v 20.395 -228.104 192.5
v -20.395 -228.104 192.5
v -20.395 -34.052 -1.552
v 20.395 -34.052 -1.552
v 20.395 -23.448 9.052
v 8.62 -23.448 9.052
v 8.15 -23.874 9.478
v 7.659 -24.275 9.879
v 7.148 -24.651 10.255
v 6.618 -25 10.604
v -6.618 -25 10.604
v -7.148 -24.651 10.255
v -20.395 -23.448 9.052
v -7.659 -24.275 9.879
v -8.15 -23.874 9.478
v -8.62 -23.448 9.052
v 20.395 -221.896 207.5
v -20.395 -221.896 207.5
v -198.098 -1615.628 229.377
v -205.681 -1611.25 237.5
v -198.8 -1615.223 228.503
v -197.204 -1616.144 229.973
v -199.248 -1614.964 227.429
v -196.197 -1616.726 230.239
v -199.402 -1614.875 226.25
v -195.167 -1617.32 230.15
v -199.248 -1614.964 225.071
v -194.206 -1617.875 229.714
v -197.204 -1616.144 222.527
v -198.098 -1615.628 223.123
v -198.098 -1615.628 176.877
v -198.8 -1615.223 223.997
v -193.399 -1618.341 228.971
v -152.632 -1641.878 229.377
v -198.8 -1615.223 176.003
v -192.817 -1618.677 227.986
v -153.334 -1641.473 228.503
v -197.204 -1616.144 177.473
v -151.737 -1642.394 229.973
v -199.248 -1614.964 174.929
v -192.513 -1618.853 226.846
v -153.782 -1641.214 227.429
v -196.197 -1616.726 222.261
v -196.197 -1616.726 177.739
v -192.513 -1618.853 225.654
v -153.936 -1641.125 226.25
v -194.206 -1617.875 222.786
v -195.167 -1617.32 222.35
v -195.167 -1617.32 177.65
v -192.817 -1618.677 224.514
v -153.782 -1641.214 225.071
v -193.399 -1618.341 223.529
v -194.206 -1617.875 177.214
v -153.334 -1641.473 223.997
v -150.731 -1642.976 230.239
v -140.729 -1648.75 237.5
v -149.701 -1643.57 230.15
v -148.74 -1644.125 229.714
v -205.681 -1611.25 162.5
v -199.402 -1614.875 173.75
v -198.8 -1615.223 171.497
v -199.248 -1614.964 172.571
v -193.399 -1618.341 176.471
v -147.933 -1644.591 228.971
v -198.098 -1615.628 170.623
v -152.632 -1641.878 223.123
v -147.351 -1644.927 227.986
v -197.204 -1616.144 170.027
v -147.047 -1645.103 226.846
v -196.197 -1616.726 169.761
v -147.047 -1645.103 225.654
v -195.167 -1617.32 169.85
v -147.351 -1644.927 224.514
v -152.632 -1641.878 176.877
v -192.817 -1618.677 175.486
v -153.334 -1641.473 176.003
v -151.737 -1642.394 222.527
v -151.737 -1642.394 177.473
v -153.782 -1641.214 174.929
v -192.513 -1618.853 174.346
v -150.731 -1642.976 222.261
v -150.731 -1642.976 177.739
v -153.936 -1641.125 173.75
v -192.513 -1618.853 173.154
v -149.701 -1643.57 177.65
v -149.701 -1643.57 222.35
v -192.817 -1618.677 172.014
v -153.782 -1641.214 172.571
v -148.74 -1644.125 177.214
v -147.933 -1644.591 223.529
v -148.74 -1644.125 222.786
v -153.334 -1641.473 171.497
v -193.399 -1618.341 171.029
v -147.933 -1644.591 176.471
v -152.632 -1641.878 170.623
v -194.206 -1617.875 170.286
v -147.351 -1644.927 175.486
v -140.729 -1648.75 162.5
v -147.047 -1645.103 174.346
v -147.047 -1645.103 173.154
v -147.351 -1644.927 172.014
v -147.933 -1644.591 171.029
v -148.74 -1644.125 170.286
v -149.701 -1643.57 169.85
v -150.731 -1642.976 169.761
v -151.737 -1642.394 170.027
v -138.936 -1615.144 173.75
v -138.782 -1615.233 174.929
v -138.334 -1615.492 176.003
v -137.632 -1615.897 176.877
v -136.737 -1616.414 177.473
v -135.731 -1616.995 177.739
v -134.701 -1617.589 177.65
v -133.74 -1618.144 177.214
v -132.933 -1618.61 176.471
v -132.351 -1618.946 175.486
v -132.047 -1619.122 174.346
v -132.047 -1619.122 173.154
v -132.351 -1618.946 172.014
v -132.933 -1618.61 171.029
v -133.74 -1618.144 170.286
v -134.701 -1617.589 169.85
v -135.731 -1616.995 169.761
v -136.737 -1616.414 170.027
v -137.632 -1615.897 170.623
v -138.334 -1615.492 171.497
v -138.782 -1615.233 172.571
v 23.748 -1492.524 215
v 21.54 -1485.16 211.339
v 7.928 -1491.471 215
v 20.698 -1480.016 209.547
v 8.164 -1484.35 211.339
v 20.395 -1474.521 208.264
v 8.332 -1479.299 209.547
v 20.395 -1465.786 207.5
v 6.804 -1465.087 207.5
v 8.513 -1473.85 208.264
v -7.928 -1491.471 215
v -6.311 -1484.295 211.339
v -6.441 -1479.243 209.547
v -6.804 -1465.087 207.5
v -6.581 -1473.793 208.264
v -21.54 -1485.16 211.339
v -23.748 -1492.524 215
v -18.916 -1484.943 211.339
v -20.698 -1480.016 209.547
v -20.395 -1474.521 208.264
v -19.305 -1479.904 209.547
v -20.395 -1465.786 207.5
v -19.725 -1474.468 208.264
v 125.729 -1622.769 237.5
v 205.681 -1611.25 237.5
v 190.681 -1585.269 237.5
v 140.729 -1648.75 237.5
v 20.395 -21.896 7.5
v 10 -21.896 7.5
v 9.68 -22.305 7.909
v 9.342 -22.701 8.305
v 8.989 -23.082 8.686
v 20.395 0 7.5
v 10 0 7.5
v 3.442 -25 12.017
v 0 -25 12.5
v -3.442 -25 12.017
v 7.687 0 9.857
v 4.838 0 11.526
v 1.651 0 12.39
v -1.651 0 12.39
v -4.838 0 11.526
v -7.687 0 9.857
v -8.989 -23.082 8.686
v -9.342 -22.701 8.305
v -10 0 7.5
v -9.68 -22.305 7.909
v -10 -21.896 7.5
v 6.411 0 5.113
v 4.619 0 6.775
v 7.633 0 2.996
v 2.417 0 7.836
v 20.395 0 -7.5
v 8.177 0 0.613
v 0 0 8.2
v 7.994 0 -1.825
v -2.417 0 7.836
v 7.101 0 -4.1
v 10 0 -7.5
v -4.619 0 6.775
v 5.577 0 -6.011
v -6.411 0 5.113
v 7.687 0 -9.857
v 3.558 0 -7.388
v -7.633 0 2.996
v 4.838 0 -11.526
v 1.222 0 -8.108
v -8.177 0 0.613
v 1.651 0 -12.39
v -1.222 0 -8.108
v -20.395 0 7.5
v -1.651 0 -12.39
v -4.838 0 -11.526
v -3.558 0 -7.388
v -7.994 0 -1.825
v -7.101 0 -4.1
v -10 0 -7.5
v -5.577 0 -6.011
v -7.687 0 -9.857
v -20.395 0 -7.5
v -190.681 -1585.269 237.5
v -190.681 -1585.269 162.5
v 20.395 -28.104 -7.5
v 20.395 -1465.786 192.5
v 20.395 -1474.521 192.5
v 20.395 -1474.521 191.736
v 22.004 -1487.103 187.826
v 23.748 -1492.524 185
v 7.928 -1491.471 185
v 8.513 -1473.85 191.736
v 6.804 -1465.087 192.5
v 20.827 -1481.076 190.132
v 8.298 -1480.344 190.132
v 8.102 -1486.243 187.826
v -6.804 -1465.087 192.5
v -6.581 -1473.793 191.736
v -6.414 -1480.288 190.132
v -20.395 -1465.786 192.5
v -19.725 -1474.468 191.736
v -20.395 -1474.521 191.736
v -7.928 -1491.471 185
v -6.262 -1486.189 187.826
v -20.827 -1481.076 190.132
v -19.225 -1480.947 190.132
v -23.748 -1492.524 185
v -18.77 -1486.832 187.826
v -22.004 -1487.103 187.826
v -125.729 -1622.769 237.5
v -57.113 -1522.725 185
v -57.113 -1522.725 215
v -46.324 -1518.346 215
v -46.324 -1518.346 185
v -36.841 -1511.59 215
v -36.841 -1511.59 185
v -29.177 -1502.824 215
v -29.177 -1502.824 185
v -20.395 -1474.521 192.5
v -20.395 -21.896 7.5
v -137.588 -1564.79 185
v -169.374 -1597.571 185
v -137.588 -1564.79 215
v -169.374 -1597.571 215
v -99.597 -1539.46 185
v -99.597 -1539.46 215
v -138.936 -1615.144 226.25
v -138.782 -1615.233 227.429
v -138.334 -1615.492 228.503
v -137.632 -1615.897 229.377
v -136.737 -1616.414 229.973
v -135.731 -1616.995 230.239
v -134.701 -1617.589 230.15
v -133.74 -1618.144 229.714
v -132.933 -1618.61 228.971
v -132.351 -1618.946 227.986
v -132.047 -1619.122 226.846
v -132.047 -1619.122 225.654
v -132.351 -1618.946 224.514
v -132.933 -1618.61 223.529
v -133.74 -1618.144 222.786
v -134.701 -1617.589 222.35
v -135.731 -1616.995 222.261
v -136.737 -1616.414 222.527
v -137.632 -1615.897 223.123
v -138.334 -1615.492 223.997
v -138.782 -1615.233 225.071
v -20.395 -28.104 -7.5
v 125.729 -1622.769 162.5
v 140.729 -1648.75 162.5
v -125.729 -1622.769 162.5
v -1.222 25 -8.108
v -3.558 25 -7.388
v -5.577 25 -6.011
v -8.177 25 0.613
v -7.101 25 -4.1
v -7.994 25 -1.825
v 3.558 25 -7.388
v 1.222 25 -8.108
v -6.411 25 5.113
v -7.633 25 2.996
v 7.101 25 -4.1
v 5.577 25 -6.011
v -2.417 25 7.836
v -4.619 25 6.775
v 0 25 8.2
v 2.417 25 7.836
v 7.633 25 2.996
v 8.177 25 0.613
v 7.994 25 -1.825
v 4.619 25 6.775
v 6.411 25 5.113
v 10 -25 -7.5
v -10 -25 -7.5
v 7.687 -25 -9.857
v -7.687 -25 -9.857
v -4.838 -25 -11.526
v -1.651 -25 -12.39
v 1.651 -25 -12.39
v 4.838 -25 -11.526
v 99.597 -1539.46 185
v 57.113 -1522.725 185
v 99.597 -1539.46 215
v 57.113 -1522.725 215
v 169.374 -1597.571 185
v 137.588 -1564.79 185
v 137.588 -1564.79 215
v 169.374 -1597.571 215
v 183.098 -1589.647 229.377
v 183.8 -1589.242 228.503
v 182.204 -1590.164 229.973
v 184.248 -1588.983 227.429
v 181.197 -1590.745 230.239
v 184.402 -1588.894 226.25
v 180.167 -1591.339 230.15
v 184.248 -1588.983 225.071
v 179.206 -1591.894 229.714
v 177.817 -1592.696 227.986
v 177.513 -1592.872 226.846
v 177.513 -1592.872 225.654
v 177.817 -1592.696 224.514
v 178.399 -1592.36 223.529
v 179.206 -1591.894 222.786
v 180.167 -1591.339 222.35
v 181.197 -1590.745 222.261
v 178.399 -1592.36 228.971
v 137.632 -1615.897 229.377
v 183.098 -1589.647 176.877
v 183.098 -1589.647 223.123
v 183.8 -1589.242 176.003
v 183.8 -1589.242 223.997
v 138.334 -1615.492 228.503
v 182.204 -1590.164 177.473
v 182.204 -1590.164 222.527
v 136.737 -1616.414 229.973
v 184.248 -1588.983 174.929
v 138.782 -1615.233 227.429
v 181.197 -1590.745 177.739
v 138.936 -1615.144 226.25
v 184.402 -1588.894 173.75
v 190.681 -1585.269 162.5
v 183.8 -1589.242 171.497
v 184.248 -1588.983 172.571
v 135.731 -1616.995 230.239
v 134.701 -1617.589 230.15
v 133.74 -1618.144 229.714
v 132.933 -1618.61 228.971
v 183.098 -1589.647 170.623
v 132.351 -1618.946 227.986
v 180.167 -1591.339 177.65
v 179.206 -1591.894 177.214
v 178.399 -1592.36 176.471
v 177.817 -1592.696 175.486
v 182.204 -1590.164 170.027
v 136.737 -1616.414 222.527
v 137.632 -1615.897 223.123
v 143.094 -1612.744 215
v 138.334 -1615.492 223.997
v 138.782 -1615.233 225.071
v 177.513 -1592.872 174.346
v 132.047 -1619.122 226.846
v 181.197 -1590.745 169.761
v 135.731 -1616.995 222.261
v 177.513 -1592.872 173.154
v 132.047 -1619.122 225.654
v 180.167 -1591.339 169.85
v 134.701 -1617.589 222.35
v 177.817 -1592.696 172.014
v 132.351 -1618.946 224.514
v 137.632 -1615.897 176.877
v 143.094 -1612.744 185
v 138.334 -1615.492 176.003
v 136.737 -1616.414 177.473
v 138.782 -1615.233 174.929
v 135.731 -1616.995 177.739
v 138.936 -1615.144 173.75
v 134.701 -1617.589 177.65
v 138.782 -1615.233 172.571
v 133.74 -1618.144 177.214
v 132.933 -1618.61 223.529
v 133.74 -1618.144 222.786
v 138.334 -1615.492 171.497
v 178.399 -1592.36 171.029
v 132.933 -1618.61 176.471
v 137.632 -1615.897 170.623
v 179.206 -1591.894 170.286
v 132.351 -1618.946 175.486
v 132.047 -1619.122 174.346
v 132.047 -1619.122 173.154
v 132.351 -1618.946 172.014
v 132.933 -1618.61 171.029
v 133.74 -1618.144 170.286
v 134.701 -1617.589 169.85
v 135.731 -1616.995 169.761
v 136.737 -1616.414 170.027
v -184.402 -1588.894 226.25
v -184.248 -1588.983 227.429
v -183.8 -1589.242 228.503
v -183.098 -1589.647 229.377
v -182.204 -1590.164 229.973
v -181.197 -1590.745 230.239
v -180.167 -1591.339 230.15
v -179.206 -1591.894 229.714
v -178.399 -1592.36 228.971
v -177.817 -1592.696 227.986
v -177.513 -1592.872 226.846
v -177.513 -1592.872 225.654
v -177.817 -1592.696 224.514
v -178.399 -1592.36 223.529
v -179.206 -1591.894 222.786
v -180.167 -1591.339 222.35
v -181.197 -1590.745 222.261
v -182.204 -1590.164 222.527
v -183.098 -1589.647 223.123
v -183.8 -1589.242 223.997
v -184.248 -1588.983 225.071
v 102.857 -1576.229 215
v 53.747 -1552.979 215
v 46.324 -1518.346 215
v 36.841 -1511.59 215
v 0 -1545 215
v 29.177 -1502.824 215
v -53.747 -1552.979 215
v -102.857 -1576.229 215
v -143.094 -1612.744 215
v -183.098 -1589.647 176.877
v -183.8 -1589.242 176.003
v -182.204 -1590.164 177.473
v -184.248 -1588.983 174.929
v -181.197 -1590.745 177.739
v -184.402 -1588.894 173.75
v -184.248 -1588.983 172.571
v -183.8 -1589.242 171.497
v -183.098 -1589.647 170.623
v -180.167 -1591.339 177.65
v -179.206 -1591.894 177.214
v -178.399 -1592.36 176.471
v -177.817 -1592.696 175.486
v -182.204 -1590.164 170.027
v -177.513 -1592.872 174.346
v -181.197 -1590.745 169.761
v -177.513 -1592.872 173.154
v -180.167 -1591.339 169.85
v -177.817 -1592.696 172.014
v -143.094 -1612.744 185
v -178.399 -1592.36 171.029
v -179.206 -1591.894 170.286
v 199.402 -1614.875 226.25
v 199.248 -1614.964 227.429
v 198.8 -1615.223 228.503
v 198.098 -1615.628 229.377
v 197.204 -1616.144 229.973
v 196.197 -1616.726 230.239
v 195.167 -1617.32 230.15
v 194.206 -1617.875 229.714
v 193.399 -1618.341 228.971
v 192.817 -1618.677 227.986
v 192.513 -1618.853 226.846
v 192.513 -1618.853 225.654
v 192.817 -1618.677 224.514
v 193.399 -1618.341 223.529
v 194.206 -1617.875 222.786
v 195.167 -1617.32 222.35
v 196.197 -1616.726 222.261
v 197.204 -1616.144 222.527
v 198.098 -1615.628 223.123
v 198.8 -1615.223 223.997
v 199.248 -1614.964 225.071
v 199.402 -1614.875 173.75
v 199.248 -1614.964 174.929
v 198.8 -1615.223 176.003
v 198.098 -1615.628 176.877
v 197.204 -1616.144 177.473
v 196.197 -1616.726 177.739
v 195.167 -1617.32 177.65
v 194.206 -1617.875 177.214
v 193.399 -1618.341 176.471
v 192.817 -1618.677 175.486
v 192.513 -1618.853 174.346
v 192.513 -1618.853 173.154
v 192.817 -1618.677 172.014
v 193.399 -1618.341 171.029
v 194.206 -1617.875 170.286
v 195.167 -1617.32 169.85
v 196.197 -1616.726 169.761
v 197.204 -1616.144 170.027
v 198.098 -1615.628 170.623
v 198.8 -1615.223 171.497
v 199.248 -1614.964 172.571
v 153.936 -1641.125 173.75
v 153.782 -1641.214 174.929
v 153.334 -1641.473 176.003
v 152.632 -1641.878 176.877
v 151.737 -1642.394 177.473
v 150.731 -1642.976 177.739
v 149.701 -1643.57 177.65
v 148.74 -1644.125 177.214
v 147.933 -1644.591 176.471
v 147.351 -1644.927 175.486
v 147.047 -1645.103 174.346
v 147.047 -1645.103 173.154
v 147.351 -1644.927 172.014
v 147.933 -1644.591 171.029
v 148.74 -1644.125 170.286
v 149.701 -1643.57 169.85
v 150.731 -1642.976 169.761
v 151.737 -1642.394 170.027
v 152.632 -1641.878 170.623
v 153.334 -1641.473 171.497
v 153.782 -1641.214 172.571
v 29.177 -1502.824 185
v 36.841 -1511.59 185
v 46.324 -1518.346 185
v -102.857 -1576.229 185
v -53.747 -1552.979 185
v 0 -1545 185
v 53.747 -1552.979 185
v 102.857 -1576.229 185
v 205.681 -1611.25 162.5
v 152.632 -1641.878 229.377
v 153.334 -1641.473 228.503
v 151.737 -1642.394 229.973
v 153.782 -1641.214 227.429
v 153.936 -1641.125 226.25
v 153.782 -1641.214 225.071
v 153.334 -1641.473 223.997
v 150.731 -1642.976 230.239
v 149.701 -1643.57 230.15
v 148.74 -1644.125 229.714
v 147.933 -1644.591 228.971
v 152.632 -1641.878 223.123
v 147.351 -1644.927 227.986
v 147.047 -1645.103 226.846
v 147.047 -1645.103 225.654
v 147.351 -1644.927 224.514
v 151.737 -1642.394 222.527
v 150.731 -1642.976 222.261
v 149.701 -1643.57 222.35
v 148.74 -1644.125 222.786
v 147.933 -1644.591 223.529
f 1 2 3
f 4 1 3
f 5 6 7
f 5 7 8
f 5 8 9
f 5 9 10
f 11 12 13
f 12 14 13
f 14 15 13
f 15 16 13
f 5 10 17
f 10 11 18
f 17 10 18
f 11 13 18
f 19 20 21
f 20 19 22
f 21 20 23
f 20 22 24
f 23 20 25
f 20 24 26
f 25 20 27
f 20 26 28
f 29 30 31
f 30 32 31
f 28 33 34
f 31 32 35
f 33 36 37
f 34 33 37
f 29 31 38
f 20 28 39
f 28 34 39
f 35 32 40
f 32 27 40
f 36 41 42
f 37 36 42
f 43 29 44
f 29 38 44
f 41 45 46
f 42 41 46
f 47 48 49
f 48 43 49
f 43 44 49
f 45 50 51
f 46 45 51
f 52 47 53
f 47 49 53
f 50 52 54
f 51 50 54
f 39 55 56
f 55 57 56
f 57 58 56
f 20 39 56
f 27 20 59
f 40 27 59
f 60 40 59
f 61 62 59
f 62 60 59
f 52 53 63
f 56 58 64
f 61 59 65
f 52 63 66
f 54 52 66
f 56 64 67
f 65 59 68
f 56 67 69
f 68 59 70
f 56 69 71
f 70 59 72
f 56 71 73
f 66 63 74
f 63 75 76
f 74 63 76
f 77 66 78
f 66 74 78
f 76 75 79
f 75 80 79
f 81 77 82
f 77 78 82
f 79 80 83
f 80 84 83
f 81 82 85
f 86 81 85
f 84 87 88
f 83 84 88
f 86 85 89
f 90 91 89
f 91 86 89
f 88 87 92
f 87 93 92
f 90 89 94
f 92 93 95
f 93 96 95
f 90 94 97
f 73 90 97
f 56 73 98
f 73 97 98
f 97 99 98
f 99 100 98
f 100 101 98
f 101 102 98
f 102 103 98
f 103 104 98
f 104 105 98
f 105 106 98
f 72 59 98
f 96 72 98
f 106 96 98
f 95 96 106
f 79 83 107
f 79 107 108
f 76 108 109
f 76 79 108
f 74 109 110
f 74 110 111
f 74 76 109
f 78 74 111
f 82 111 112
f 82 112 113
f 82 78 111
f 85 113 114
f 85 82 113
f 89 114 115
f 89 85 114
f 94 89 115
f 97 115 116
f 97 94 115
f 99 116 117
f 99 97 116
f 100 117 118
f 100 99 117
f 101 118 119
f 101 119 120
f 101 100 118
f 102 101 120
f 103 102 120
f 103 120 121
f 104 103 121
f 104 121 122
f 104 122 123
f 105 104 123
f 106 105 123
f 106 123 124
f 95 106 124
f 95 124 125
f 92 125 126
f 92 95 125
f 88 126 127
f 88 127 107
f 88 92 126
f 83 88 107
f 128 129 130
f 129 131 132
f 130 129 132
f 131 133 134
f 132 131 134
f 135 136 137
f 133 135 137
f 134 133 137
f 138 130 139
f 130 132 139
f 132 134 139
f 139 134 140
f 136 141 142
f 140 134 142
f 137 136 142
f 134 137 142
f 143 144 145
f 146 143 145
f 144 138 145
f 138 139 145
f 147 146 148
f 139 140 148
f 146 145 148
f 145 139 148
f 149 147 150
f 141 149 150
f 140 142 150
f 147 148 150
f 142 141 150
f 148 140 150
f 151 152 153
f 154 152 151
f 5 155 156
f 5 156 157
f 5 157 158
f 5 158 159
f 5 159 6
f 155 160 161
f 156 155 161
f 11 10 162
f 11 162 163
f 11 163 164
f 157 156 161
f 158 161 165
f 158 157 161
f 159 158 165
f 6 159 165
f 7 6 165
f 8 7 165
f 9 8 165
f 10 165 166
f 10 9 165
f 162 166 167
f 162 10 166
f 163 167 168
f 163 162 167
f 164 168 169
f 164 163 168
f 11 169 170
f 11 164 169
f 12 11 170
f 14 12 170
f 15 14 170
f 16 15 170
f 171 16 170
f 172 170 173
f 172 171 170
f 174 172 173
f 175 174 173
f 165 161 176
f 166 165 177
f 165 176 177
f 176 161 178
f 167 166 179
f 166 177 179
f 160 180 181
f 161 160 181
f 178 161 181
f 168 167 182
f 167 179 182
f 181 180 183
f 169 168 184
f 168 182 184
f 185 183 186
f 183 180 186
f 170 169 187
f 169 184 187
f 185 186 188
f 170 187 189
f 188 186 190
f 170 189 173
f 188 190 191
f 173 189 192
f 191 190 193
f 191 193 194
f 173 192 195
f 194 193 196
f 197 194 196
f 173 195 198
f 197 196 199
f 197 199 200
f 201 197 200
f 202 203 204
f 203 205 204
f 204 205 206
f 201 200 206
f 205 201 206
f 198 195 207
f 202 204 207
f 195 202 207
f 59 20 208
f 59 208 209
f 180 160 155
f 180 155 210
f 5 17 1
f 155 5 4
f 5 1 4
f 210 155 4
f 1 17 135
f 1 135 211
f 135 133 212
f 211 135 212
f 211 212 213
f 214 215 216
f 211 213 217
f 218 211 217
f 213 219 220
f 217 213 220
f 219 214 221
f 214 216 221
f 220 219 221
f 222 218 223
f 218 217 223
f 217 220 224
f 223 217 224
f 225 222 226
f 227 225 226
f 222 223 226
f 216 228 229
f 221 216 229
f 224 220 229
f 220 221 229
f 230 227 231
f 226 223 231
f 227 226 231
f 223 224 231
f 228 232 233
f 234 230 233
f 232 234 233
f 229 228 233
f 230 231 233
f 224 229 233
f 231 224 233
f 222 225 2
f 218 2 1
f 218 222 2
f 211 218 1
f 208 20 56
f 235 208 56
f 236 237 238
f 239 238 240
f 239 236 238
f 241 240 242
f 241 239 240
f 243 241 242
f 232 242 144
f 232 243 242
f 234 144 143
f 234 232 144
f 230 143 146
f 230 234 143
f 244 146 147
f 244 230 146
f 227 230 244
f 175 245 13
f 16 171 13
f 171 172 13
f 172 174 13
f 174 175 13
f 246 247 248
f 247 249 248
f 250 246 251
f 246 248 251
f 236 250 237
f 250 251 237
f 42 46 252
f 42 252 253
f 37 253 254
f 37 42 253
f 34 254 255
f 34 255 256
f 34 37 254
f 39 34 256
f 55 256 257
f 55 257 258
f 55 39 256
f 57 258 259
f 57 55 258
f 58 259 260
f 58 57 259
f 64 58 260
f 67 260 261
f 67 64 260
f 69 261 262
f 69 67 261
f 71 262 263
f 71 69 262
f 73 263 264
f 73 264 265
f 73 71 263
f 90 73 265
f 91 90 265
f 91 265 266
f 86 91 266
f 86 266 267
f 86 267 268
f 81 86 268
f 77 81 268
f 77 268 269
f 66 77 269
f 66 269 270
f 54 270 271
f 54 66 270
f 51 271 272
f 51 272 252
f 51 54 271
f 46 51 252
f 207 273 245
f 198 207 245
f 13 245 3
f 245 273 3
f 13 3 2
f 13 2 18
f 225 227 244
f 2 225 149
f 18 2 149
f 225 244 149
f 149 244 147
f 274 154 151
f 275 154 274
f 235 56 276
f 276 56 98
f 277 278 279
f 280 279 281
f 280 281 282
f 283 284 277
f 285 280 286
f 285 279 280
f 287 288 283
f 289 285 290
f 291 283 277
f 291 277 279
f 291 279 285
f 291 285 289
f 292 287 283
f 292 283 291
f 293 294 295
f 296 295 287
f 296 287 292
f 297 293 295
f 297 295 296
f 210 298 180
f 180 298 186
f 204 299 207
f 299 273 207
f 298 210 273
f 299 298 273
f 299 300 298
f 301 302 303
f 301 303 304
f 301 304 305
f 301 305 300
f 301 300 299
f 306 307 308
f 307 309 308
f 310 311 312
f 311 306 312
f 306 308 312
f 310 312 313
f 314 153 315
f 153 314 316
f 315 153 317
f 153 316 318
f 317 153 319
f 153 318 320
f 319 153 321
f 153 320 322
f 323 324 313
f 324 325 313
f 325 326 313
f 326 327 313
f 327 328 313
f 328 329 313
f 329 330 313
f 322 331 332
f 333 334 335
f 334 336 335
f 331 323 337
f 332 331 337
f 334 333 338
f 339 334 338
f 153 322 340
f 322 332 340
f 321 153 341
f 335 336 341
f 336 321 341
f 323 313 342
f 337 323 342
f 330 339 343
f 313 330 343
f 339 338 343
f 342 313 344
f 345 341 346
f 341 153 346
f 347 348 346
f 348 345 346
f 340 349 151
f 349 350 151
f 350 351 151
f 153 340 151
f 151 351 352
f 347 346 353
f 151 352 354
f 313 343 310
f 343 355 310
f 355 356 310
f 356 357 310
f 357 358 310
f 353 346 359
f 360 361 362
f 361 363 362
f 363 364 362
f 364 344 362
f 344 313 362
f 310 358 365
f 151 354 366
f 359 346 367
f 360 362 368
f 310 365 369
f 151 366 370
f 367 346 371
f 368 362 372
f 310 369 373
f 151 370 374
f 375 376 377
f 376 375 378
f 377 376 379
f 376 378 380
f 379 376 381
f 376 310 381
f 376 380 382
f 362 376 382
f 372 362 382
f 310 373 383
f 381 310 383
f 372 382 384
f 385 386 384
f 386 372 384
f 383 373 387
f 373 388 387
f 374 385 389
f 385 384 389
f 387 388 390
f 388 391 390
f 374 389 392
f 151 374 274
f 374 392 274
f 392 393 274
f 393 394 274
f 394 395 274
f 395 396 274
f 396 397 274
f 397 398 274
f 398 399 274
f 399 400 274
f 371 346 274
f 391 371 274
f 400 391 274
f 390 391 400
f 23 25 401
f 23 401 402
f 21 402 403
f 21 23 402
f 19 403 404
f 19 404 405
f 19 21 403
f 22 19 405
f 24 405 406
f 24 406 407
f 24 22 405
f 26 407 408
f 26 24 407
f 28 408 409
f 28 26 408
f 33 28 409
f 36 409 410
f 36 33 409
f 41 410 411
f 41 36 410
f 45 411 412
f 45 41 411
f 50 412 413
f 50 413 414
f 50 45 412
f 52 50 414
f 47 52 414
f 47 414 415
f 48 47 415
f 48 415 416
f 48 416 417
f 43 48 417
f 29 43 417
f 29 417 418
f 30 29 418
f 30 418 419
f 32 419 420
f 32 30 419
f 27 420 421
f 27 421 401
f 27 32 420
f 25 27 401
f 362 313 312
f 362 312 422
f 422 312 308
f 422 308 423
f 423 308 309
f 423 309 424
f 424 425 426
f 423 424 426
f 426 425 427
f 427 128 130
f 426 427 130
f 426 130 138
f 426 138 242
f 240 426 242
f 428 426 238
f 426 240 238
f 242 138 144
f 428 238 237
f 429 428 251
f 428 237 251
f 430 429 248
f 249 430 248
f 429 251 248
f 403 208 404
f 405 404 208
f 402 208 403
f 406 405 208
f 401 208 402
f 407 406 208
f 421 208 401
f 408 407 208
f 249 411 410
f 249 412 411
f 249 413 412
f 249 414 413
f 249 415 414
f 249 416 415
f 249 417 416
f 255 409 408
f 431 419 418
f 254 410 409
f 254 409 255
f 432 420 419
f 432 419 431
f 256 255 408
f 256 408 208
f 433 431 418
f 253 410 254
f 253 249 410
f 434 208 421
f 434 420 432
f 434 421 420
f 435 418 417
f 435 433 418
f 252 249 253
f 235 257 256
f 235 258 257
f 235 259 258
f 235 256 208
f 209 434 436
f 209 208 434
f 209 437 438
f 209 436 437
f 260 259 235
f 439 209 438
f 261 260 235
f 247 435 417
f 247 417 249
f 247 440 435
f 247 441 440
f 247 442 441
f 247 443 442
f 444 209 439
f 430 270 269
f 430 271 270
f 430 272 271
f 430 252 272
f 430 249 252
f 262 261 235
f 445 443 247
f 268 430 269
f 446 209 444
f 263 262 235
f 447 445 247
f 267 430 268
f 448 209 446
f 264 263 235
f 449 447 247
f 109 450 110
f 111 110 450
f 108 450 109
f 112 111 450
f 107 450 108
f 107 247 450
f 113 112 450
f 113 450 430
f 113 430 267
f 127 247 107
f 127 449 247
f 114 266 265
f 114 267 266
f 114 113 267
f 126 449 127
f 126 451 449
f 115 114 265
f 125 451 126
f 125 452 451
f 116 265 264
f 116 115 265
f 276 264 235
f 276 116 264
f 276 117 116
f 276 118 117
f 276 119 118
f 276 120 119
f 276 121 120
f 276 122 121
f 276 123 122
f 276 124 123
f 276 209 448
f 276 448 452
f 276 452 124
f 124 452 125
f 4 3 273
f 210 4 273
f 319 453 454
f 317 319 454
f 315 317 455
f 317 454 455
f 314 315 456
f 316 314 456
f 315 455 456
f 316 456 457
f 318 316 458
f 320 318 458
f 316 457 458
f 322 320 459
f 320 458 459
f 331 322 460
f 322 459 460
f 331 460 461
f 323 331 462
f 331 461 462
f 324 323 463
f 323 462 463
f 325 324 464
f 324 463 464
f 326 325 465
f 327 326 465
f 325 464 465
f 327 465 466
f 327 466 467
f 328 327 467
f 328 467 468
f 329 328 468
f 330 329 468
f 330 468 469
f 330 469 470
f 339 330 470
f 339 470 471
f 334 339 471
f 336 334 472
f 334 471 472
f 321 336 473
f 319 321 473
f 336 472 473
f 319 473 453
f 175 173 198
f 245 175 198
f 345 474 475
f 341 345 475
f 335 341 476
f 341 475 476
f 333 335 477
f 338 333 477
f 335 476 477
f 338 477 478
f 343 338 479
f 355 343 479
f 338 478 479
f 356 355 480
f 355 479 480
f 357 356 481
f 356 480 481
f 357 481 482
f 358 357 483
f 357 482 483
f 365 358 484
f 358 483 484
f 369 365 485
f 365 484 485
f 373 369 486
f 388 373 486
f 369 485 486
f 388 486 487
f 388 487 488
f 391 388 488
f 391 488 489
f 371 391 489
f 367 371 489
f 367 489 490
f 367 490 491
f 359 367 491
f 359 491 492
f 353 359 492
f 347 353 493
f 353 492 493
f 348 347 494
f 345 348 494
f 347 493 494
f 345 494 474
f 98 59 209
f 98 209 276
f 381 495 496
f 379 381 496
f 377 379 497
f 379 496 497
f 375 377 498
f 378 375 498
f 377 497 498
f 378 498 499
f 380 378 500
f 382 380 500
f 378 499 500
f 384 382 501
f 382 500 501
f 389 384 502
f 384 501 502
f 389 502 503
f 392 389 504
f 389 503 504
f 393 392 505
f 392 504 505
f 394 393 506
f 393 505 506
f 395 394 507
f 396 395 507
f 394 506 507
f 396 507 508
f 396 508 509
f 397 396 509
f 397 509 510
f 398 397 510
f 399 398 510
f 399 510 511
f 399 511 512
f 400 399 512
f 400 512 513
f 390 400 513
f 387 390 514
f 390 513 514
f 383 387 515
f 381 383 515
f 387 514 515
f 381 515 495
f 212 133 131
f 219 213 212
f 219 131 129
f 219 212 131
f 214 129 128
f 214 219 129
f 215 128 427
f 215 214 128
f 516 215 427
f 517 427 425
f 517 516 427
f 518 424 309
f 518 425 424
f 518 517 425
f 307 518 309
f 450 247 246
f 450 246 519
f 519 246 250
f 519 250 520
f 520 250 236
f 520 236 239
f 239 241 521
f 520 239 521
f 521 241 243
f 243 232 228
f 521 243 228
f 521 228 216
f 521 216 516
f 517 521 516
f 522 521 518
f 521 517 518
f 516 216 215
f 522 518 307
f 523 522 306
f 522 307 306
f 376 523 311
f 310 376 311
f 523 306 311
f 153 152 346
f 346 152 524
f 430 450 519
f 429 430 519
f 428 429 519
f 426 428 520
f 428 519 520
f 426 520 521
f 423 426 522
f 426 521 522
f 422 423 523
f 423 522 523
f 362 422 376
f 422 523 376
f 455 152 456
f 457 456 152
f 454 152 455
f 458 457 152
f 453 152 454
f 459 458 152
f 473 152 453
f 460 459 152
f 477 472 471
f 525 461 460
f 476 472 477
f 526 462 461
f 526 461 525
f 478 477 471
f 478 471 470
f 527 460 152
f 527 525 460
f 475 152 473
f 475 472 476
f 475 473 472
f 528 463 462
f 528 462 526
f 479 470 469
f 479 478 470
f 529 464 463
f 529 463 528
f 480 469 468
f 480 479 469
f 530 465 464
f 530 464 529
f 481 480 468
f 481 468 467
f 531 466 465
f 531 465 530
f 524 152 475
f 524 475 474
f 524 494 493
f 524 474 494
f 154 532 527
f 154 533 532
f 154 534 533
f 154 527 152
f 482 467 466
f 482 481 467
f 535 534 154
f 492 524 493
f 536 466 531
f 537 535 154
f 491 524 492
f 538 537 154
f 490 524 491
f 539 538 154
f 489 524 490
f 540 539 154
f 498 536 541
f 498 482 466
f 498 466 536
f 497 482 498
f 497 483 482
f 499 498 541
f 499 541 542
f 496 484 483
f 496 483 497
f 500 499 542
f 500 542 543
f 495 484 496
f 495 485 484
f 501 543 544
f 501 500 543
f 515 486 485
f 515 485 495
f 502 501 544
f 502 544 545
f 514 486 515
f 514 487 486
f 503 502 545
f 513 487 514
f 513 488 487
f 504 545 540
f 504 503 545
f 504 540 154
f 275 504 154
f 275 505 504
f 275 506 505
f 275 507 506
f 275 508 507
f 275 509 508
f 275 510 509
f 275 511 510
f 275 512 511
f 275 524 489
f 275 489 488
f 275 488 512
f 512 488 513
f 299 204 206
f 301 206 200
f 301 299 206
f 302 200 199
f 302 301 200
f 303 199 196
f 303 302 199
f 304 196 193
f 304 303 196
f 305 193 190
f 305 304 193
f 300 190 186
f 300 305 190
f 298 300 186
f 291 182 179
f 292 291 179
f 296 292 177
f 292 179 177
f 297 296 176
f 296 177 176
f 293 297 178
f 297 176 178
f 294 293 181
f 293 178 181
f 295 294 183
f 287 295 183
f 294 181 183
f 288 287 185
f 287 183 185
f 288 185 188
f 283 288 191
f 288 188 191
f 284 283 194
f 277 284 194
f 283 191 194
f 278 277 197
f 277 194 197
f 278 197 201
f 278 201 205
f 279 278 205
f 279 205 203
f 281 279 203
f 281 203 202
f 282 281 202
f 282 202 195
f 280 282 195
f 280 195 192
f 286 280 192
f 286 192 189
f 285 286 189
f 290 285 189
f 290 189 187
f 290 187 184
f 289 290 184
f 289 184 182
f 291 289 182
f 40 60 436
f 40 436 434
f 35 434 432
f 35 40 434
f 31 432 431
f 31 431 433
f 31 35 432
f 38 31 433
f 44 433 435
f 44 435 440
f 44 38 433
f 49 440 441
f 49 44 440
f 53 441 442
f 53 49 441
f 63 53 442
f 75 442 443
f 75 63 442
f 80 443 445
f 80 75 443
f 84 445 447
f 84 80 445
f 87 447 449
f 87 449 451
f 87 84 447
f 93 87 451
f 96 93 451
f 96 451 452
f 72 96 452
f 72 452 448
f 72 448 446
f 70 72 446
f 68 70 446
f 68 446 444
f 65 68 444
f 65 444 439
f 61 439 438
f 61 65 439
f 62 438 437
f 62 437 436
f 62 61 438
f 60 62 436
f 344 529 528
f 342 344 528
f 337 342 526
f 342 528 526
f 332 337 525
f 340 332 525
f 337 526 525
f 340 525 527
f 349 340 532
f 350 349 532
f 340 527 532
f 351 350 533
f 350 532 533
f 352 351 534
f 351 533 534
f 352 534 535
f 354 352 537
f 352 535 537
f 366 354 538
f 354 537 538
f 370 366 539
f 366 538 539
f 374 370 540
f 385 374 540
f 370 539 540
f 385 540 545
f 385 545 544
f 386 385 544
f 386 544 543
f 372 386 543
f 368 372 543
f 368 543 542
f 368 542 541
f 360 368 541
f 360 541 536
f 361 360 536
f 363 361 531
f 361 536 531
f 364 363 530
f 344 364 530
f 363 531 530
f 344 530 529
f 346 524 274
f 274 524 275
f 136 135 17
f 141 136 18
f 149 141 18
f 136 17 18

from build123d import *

# Parameters (mm, degrees)
SKETCH1_R                = 8.2
BOSS_EXTRUDE1_DEPTH      = 25
SKETCH2_W                = 40.79
SKETCH2_H                = 15
BOSS_EXTRUDE2_DEPTH      = 25
SKETCH3_R                = 12.5
BOSS_EXTRUDE4_DEPTH      = 25
BOSS_EXTRUDE5_REACH      = 51.448
SKETCH5_W                = 40.79
SKETCH5_H                = 15
BOSS_EXTRUDE7_DEPTH      = 1505
BOSS_EXTRUDE8_START      = -40.79
BOSS_EXTRUDE8_DEPTH      = 40.79
SKETCH9_W                = 15
SKETCH9_H                = 15
REVOLVE1_ANGLE           = 60
REVOLVE1_OTHER_WAY_ANGLE = 60
FILLET3_R                = 50
SKETCH11_W               = 75
SKETCH11_H               = 75
SKETCH11_R               = 4
BOSS_EXTRUDE9_DEPTH      = 30
CUT_EXTRUDE2_DEPTH       = 1755.203433898


with BuildPart() as part:
    # Sketch1 → Boss-Extrude1 (new body)
    with BuildSketch(Plane(origin=(0, 0, 0), x_dir=(1, 0, 0), z_dir=(0, 1, 0))):
        with Locations(Location((0, 0, 0), (0, 0, 270))):
            Circle(SKETCH1_R)
    extrude(amount=BOSS_EXTRUDE1_DEPTH)

    # Sketch2 → Boss-Extrude2 (add)
    with BuildSketch(Plane(origin=(0, 0, 0), x_dir=(-1, 0, 0), z_dir=(0, -1, 0))):
        Rectangle(SKETCH2_W, SKETCH2_H)
    extrude(amount=BOSS_EXTRUDE2_DEPTH)

    # Sketch3 → Boss-Extrude4 (add)
    with BuildSketch(Plane(origin=(0, -25, 0), x_dir=(-1, 0, 0), z_dir=(0, -1, 0))):
        Circle(SKETCH3_R)
    extrude(amount=-BOSS_EXTRUDE4_DEPTH)

    # Boss-Extrude5: up to this face of the body (flat: up to its plane)
    boss_extrude5_end = Plane(part.part.faces().sort_by_distance((20.395, -12.5, 0))[0])
    # Sketch4 → Boss-Extrude5 (add, up to the picked face)
    with BuildSketch(Plane.ZY.offset(20.395), mode=Mode.PRIVATE) as boss_extrude5_sk1:
        Polygon((192.5, -225), (-7.5, -25), (7.5, -25), (207.5, -225), align=None)
    boss_extrude5_tool1 = split(extrude(boss_extrude5_sk1.sketch, amount=-BOSS_EXTRUDE5_REACH, mode=Mode.PRIVATE), bisect_by=boss_extrude5_end, keep=Keep.BOTH, mode=Mode.PRIVATE)
    add(boss_extrude5_tool1.solids().sort_by(Axis((-20.395, -125, 100), (1, 0, 0)))[0])

    # Sketch5 → Boss-Extrude7 (add)
    with BuildSketch(Plane(origin=(0, -225, 0), x_dir=(-1, 0, 0), z_dir=(0, -1, 0))):
        with Locations((0, -200)):
            Rectangle(SKETCH5_W, SKETCH5_H)
    extrude(amount=BOSS_EXTRUDE7_DEPTH)

    # Sketch7 → Boss-Extrude8 (add)
    with BuildSketch(Plane(origin=(20.395, 0, 0), x_dir=(0, 0, -1), z_dir=(1, 0, 0)).offset(BOSS_EXTRUDE8_START)):
        Polygon((1.552099385, -34.052099385), (0, -32.5), (-192.5, -225), (-192.5, -228.104198769), align=None)
        Polygon((7.5, -25), (0, -32.5), (1.552099385, -34.052099385), (7.5, -28.104198769), align=None)
        Polygon((-9.052099385, -23.447900615), (-207.5, -221.895801231), (-207.5, -225), (-7.5, -25), align=None)
        Polygon((-9.052099385, -23.447900615), (-7.5, -25), (-7.5, -21.895801231), align=None)
    extrude(amount=BOSS_EXTRUDE8_DEPTH)

    # Sketch9 → Revolve1 (revolve)
    with BuildSketch(Plane(origin=(0, 0, 0), x_dir=(0, 0, -1), z_dir=(1, 0, 0))):
        with Locations((-207.5, -1522.5)):
            Rectangle(SKETCH9_W, SKETCH9_H)
        Polygon((-185, -1545), (-185, -1530), (-200, -1530), (-215, -1530), (-215, -1545), align=None)
        with Locations((-192.5, -1522.5)):
            Rectangle(SKETCH9_W, SKETCH9_H)
    revolve(axis=Axis((0, -1730, 192.5), (0, 0, 1)), revolution_arc=REVOLVE1_ANGLE)

    # Sketch9 → Revolve1 other way (revolve)
    with BuildSketch(Plane(origin=(0, 0, 0), x_dir=(0, 0, -1), z_dir=(1, 0, 0))):
        with Locations((-207.5, -1522.5)):
            Rectangle(SKETCH9_W, SKETCH9_H)
        Polygon((-185, -1545), (-185, -1530), (-200, -1530), (-215, -1530), (-215, -1545), align=None)
        with Locations((-192.5, -1522.5)):
            Rectangle(SKETCH9_W, SKETCH9_H)
    revolve(axis=Axis((0, -1730, 192.5), (0, 0, -1)), revolution_arc=REVOLVE1_OTHER_WAY_ANGLE)

    # Fillet3
    # the kernel refuses this fillet: 50 mm, written as the material it adds along each edge
    with BuildSketch(Plane(origin=(0, -1730, 207.5), x_dir=(0.6259913130832682, 0.7798300301631668, 0), z_dir=(0.7798300301631668, -0.6259913130832682, 0))) as fillet3_piece_1_section:
        with BuildLine():
            CenterArc((215 + FILLET3_R, FILLET3_R), FILLET3_R, 180, 90)
            Line((215, FILLET3_R), (215, 0))
            Line((215, 0), (215 + FILLET3_R, 0))
        make_face()
    fillet3_piece_1 = revolve(axis=Axis((0, -1730, 207.5), (0, 0, 1)), revolution_arc=77.509968484, mode=Mode.PRIVATE)
    fillet3_piece_1 = split(fillet3_piece_1, bisect_by=Plane(origin=(20.395, -1497.728593149, 210.201005202), z_dir=(-1, 0, 0)), keep=Keep.TOP, mode=Mode.PRIVATE)
    fillet3_piece_1 = split(fillet3_piece_1, bisect_by=Plane(origin=(-20.395, -1497.728593149, 210.201005202), z_dir=(1, 0, 0)), keep=Keep.TOP, mode=Mode.PRIVATE)
    fillet3_piece_1 = split(fillet3_piece_1, bisect_by=Plane(origin=(0, -1497.728593149, 215), z_dir=(0, 0, -1)), keep=Keep.TOP, mode=Mode.PRIVATE)
    add(fillet3_piece_1)
    with BuildSketch(Plane(origin=(-20.395, -1515.969525593, 192.5), x_dir=(-0.9834951946600375, -0.1809342479482942, 0), z_dir=(0, 0, 1))) as fillet3_piece_2:
        with BuildLine():
            CenterArc((41.675293239, -49.811185367), FILLET3_R, 94.980893043, 74.594925131)
            Line((-7.499466494, -40.764472969), (0, 0))
            ThreePointArc((0, 0), (18.66705843, -0.811902923), (37.33411686, 0))
        make_face()
    extrude(amount=15)
    with BuildSketch(Plane(origin=(0, -1730, 192.5), x_dir=(0.6259913130832687, 0.7798300301631664, 0), z_dir=(0.7798300301631664, -0.6259913130832687, 0))) as fillet3_piece_3_section:
        with BuildLine():
            CenterArc((215 + FILLET3_R, -FILLET3_R), FILLET3_R, 90, 90)
            Line((215 + FILLET3_R, 0), (215, 0))
            Line((215, 0), (215, -FILLET3_R))
        make_face()
    fillet3_piece_3 = revolve(axis=Axis((0, -1730, 192.5), (0, 0, 1)), revolution_arc=77.509968484, mode=Mode.PRIVATE)
    fillet3_piece_3 = split(fillet3_piece_3, bisect_by=Plane(origin=(0, -1497.728593149, 185), z_dir=(0, 0, 1)), keep=Keep.TOP, mode=Mode.PRIVATE)
    fillet3_piece_3 = split(fillet3_piece_3, bisect_by=Plane(origin=(-20.395, -1497.728593149, 189.798994798), z_dir=(1, 0, 0)), keep=Keep.TOP, mode=Mode.PRIVATE)
    fillet3_piece_3 = split(fillet3_piece_3, bisect_by=Plane(origin=(20.395, -1497.728593149, 189.798994798), z_dir=(-1, 0, 0)), keep=Keep.TOP, mode=Mode.PRIVATE)
    add(fillet3_piece_3)
    with BuildSketch(Plane(origin=(20.395, -1515.969525593, 192.5), x_dir=(0.9834951946600374, -0.18093424794829469, 0), z_dir=(0, 0, 1))) as fillet3_piece_4:
        with BuildLine():
            CenterArc((41.675293239, 49.811185367), FILLET3_R, 190.424181826, 74.594925131)
            Line((-7.499466494, 40.764472969), (0, 0))
            ThreePointArc((0, 0), (18.66705843, 0.811902923), (37.33411686, 0))
        make_face()
    extrude(amount=15)
    with BuildSketch(Plane(origin=(0, -1730, 207.5), x_dir=(0.6259913130832682, 0.7798300301631668, 0), z_dir=(0.7798300301631668, -0.6259913130832682, 0))) as fillet3_piece_5a_section:
        with BuildLine():
            CenterArc((215 + FILLET3_R, FILLET3_R), FILLET3_R, 180, 90)
            Line((215, FILLET3_R), (215, 0))
            Line((215, 0), (215 + FILLET3_R, 0))
        make_face()
    fillet3_piece_5a = revolve(axis=Axis((0, -1730, 207.5), (0, 0, 1)), revolution_arc=77.509968484, mode=Mode.PRIVATE)
    fillet3_piece_5a = split(fillet3_piece_5a, bisect_by=Plane(origin=(20.395, -1516.663886588, 210.150724115), z_dir=(1, 0, 0)), keep=Keep.TOP, mode=Mode.PRIVATE)
    fillet3_piece_5a = split(fillet3_piece_5a, bisect_by=Plane(origin=(85.698064456, -1516.663886588, 215), z_dir=(0, 0, -1)), keep=Keep.TOP, mode=Mode.PRIVATE)
    with BuildSketch(Plane(origin=(20.395, -1515.969525593, 192.5), x_dir=(0.9834951946600374, -0.18093424794829469, 0), z_dir=(0, 0, 1))) as fillet3_piece_5b_section:
        with BuildLine():
            CenterArc((41.675293239, 49.811185367), FILLET3_R, 190.424181826, 74.594925131)
            Line((-7.499466494, 40.764472969), (0, 0))
            ThreePointArc((0, 0), (18.66705843, 0.811902923), (37.33411686, 0))
        make_face()
    fillet3_piece_5b = extrude(amount=118.621434021, mode=Mode.PRIVATE)
    fillet3_piece_5b = split(fillet3_piece_5b, bisect_by=Plane(origin=(28.539652215, -1507.603520272, 207.5), z_dir=(0, 0, 1)), keep=Keep.TOP, mode=Mode.PRIVATE)
    fillet3_piece_5b = split(fillet3_piece_5b, bisect_by=Plane(origin=(28.539652215, -1507.603520272, 215), z_dir=(0, 0, -1)), keep=Keep.TOP, mode=Mode.PRIVATE)
    fillet3_piece_5 = fillet3_piece_5a & fillet3_piece_5b
    add(fillet3_piece_5)
    with BuildSketch(Plane(origin=(0, -1730, 207.5), x_dir=(0.6259913130832682, 0.7798300301631668, 0), z_dir=(0.7798300301631668, -0.6259913130832682, 0))) as fillet3_piece_6a_section:
        with BuildLine():
            CenterArc((215 + FILLET3_R, FILLET3_R), FILLET3_R, 180, 90)
            Line((215, FILLET3_R), (215, 0))
            Line((215, 0), (215 + FILLET3_R, 0))
        make_face()
    fillet3_piece_6a = revolve(axis=Axis((0, -1730, 207.5), (0, 0, 1)), revolution_arc=77.509968484, mode=Mode.PRIVATE)
    fillet3_piece_6a = split(fillet3_piece_6a, bisect_by=Plane(origin=(-20.395, -1516.663887252, 210.150724175), z_dir=(-1, 0, 0)), keep=Keep.TOP, mode=Mode.PRIVATE)
    fillet3_piece_6a = split(fillet3_piece_6a, bisect_by=Plane(origin=(-85.69806423, -1516.663887252, 215), z_dir=(0, 0, -1)), keep=Keep.TOP, mode=Mode.PRIVATE)
    with BuildSketch(Plane(origin=(-20.395, -1515.969525593, 192.5), x_dir=(-0.9834951946600375, -0.1809342479482942, 0), z_dir=(0, 0, 1))) as fillet3_piece_6b_section:
        with BuildLine():
            CenterArc((41.675293239, -49.811185367), FILLET3_R, 94.980893043, 74.594925131)
            Line((-7.499466494, -40.764472969), (0, 0))
            ThreePointArc((0, 0), (18.66705843, -0.811902923), (37.33411686, 0))
        make_face()
    fillet3_piece_6b = extrude(amount=118.621434021, mode=Mode.PRIVATE)
    fillet3_piece_6b = split(fillet3_piece_6b, bisect_by=Plane(origin=(-28.539652215, -1507.603520272, 207.5), z_dir=(0, 0, 1)), keep=Keep.TOP, mode=Mode.PRIVATE)
    fillet3_piece_6b = split(fillet3_piece_6b, bisect_by=Plane(origin=(-28.539652215, -1507.603520272, 215), z_dir=(0, 0, -1)), keep=Keep.TOP, mode=Mode.PRIVATE)
    fillet3_piece_6 = fillet3_piece_6a & fillet3_piece_6b
    add(fillet3_piece_6)
    with BuildSketch(Plane(origin=(0, -1730, 192.5), x_dir=(0.6259913130832687, 0.7798300301631664, 0), z_dir=(0.7798300301631664, -0.6259913130832687, 0))) as fillet3_piece_7a_section:
        with BuildLine():
            CenterArc((215 + FILLET3_R, -FILLET3_R), FILLET3_R, 90, 90)
            Line((215 + FILLET3_R, 0), (215, 0))
            Line((215, 0), (215, -FILLET3_R))
        make_face()
    fillet3_piece_7a = revolve(axis=Axis((0, -1730, 192.5), (0, 0, 1)), revolution_arc=77.509968484, mode=Mode.PRIVATE)
    fillet3_piece_7a = split(fillet3_piece_7a, bisect_by=Plane(origin=(-85.69806423, -1516.663887252, 185), z_dir=(0, 0, 1)), keep=Keep.TOP, mode=Mode.PRIVATE)
    fillet3_piece_7a = split(fillet3_piece_7a, bisect_by=Plane(origin=(-20.395, -1516.663887252, 189.849275825), z_dir=(-1, 0, 0)), keep=Keep.TOP, mode=Mode.PRIVATE)
    with BuildSketch(Plane(origin=(-20.395, -1515.969525593, 88.878565979), x_dir=(-0.9834951946600375, -0.1809342479482942, 0), z_dir=(0, 0, 1))) as fillet3_piece_7b_section:
        with BuildLine():
            CenterArc((41.675293239, -49.811185367), FILLET3_R, 94.980893043, 74.594925131)
            Line((-7.499466494, -40.764472969), (0, 0))
            ThreePointArc((0, 0), (18.66705843, -0.811902923), (37.33411686, 0))
        make_face()
    fillet3_piece_7b = extrude(amount=118.621434021, mode=Mode.PRIVATE)
    fillet3_piece_7b = split(fillet3_piece_7b, bisect_by=Plane(origin=(-28.539652215, -1507.603520272, 185), z_dir=(0, 0, 1)), keep=Keep.TOP, mode=Mode.PRIVATE)
    fillet3_piece_7b = split(fillet3_piece_7b, bisect_by=Plane(origin=(-28.539652215, -1507.603520272, 192.5), z_dir=(0, 0, -1)), keep=Keep.TOP, mode=Mode.PRIVATE)
    fillet3_piece_7 = fillet3_piece_7a & fillet3_piece_7b
    add(fillet3_piece_7)
    with BuildSketch(Plane(origin=(0, -1730, 192.5), x_dir=(0.6259913130832687, 0.7798300301631664, 0), z_dir=(0.7798300301631664, -0.6259913130832687, 0))) as fillet3_piece_8a_section:
        with BuildLine():
            CenterArc((215 + FILLET3_R, -FILLET3_R), FILLET3_R, 90, 90)
            Line((215 + FILLET3_R, 0), (215, 0))
            Line((215, 0), (215, -FILLET3_R))
        make_face()
    fillet3_piece_8a = revolve(axis=Axis((0, -1730, 192.5), (0, 0, 1)), revolution_arc=77.509968484, mode=Mode.PRIVATE)
    fillet3_piece_8a = split(fillet3_piece_8a, bisect_by=Plane(origin=(85.698064456, -1516.663886588, 185), z_dir=(0, 0, 1)), keep=Keep.TOP, mode=Mode.PRIVATE)
    fillet3_piece_8a = split(fillet3_piece_8a, bisect_by=Plane(origin=(20.395, -1516.663886588, 189.849275885), z_dir=(1, 0, 0)), keep=Keep.TOP, mode=Mode.PRIVATE)
    with BuildSketch(Plane(origin=(20.395, -1515.969525593, 88.878565979), x_dir=(0.9834951946600374, -0.1809342479482948, 0), z_dir=(0, 0, 1))) as fillet3_piece_8b_section:
        with BuildLine():
            CenterArc((41.675293239, 49.811185367), FILLET3_R, 190.424181826, 74.594925131)
            Line((-7.499466494, 40.764472969), (0, 0))
            ThreePointArc((0, 0), (18.66705843, 0.811902923), (37.33411686, 0))
        make_face()
    fillet3_piece_8b = extrude(amount=118.621434021, mode=Mode.PRIVATE)
    fillet3_piece_8b = split(fillet3_piece_8b, bisect_by=Plane(origin=(28.539652215, -1507.603520272, 185), z_dir=(0, 0, 1)), keep=Keep.TOP, mode=Mode.PRIVATE)
    fillet3_piece_8b = split(fillet3_piece_8b, bisect_by=Plane(origin=(28.539652215, -1507.603520272, 192.5), z_dir=(0, 0, -1)), keep=Keep.TOP, mode=Mode.PRIVATE)
    fillet3_piece_8 = fillet3_piece_8a & fillet3_piece_8b
    add(fillet3_piece_8)

    # Sketch11 → Boss-Extrude9 (add)
    with BuildSketch(Plane(origin=(749.111974274, -1297.5, 0), x_dir=(-0.8660254037844398, -0.49999999999999806, 0), z_dir=(0.499999999999998, -0.8660254037844397, 0))):
        with Locations((665, -200)):
            Rectangle(SKETCH11_W, SKETCH11_H)
        with Locations(Location((638.75, -173.75, 0), (0, 0, 180))):
            Circle(SKETCH11_R, mode=Mode.SUBTRACT)
        with Locations(Location((691.25, -173.75, 0), (0, 0, 180))):
            Circle(SKETCH11_R, mode=Mode.SUBTRACT)
        with Locations(Location((691.25, -226.25, 0), (0, 0, 180))):
            Circle(SKETCH11_R, mode=Mode.SUBTRACT)
        with Locations(Location((638.75, -226.25, 0), (0, 0, 180))):
            Circle(SKETCH11_R, mode=Mode.SUBTRACT)
    boss_extrude9 = extrude(amount=-BOSS_EXTRUDE9_DEPTH)

    # Mirror1: Boss-Extrude9 across plane
    add(boss_extrude9.mirror(Plane(origin=(0, 0, 0), x_dir=(0, 0, 1), z_dir=(1, 0, 0))))

    # Sketch15 → Cut-Extrude2 (cut, through all)
    with BuildSketch(Plane(origin=(0, 0, 192.5), x_dir=(-1, 0, 0), z_dir=(0, 0, -1))):
        with BuildLine():
            Line((-20.395, -1730), (-20.395, -1546.127642167))
            ThreePointArc((-20.395, -1546.127642167), (0, -1545), (20.395, -1546.127642167))
            Line((20.395, -1546.127642167), (20.395, -1730))
            Line((20.395, -1730), (-20.395, -1730))
        make_face()
    extrude(amount=-CUT_EXTRUDE2_DEPTH, mode=Mode.SUBTRACT)


solid = part.part
